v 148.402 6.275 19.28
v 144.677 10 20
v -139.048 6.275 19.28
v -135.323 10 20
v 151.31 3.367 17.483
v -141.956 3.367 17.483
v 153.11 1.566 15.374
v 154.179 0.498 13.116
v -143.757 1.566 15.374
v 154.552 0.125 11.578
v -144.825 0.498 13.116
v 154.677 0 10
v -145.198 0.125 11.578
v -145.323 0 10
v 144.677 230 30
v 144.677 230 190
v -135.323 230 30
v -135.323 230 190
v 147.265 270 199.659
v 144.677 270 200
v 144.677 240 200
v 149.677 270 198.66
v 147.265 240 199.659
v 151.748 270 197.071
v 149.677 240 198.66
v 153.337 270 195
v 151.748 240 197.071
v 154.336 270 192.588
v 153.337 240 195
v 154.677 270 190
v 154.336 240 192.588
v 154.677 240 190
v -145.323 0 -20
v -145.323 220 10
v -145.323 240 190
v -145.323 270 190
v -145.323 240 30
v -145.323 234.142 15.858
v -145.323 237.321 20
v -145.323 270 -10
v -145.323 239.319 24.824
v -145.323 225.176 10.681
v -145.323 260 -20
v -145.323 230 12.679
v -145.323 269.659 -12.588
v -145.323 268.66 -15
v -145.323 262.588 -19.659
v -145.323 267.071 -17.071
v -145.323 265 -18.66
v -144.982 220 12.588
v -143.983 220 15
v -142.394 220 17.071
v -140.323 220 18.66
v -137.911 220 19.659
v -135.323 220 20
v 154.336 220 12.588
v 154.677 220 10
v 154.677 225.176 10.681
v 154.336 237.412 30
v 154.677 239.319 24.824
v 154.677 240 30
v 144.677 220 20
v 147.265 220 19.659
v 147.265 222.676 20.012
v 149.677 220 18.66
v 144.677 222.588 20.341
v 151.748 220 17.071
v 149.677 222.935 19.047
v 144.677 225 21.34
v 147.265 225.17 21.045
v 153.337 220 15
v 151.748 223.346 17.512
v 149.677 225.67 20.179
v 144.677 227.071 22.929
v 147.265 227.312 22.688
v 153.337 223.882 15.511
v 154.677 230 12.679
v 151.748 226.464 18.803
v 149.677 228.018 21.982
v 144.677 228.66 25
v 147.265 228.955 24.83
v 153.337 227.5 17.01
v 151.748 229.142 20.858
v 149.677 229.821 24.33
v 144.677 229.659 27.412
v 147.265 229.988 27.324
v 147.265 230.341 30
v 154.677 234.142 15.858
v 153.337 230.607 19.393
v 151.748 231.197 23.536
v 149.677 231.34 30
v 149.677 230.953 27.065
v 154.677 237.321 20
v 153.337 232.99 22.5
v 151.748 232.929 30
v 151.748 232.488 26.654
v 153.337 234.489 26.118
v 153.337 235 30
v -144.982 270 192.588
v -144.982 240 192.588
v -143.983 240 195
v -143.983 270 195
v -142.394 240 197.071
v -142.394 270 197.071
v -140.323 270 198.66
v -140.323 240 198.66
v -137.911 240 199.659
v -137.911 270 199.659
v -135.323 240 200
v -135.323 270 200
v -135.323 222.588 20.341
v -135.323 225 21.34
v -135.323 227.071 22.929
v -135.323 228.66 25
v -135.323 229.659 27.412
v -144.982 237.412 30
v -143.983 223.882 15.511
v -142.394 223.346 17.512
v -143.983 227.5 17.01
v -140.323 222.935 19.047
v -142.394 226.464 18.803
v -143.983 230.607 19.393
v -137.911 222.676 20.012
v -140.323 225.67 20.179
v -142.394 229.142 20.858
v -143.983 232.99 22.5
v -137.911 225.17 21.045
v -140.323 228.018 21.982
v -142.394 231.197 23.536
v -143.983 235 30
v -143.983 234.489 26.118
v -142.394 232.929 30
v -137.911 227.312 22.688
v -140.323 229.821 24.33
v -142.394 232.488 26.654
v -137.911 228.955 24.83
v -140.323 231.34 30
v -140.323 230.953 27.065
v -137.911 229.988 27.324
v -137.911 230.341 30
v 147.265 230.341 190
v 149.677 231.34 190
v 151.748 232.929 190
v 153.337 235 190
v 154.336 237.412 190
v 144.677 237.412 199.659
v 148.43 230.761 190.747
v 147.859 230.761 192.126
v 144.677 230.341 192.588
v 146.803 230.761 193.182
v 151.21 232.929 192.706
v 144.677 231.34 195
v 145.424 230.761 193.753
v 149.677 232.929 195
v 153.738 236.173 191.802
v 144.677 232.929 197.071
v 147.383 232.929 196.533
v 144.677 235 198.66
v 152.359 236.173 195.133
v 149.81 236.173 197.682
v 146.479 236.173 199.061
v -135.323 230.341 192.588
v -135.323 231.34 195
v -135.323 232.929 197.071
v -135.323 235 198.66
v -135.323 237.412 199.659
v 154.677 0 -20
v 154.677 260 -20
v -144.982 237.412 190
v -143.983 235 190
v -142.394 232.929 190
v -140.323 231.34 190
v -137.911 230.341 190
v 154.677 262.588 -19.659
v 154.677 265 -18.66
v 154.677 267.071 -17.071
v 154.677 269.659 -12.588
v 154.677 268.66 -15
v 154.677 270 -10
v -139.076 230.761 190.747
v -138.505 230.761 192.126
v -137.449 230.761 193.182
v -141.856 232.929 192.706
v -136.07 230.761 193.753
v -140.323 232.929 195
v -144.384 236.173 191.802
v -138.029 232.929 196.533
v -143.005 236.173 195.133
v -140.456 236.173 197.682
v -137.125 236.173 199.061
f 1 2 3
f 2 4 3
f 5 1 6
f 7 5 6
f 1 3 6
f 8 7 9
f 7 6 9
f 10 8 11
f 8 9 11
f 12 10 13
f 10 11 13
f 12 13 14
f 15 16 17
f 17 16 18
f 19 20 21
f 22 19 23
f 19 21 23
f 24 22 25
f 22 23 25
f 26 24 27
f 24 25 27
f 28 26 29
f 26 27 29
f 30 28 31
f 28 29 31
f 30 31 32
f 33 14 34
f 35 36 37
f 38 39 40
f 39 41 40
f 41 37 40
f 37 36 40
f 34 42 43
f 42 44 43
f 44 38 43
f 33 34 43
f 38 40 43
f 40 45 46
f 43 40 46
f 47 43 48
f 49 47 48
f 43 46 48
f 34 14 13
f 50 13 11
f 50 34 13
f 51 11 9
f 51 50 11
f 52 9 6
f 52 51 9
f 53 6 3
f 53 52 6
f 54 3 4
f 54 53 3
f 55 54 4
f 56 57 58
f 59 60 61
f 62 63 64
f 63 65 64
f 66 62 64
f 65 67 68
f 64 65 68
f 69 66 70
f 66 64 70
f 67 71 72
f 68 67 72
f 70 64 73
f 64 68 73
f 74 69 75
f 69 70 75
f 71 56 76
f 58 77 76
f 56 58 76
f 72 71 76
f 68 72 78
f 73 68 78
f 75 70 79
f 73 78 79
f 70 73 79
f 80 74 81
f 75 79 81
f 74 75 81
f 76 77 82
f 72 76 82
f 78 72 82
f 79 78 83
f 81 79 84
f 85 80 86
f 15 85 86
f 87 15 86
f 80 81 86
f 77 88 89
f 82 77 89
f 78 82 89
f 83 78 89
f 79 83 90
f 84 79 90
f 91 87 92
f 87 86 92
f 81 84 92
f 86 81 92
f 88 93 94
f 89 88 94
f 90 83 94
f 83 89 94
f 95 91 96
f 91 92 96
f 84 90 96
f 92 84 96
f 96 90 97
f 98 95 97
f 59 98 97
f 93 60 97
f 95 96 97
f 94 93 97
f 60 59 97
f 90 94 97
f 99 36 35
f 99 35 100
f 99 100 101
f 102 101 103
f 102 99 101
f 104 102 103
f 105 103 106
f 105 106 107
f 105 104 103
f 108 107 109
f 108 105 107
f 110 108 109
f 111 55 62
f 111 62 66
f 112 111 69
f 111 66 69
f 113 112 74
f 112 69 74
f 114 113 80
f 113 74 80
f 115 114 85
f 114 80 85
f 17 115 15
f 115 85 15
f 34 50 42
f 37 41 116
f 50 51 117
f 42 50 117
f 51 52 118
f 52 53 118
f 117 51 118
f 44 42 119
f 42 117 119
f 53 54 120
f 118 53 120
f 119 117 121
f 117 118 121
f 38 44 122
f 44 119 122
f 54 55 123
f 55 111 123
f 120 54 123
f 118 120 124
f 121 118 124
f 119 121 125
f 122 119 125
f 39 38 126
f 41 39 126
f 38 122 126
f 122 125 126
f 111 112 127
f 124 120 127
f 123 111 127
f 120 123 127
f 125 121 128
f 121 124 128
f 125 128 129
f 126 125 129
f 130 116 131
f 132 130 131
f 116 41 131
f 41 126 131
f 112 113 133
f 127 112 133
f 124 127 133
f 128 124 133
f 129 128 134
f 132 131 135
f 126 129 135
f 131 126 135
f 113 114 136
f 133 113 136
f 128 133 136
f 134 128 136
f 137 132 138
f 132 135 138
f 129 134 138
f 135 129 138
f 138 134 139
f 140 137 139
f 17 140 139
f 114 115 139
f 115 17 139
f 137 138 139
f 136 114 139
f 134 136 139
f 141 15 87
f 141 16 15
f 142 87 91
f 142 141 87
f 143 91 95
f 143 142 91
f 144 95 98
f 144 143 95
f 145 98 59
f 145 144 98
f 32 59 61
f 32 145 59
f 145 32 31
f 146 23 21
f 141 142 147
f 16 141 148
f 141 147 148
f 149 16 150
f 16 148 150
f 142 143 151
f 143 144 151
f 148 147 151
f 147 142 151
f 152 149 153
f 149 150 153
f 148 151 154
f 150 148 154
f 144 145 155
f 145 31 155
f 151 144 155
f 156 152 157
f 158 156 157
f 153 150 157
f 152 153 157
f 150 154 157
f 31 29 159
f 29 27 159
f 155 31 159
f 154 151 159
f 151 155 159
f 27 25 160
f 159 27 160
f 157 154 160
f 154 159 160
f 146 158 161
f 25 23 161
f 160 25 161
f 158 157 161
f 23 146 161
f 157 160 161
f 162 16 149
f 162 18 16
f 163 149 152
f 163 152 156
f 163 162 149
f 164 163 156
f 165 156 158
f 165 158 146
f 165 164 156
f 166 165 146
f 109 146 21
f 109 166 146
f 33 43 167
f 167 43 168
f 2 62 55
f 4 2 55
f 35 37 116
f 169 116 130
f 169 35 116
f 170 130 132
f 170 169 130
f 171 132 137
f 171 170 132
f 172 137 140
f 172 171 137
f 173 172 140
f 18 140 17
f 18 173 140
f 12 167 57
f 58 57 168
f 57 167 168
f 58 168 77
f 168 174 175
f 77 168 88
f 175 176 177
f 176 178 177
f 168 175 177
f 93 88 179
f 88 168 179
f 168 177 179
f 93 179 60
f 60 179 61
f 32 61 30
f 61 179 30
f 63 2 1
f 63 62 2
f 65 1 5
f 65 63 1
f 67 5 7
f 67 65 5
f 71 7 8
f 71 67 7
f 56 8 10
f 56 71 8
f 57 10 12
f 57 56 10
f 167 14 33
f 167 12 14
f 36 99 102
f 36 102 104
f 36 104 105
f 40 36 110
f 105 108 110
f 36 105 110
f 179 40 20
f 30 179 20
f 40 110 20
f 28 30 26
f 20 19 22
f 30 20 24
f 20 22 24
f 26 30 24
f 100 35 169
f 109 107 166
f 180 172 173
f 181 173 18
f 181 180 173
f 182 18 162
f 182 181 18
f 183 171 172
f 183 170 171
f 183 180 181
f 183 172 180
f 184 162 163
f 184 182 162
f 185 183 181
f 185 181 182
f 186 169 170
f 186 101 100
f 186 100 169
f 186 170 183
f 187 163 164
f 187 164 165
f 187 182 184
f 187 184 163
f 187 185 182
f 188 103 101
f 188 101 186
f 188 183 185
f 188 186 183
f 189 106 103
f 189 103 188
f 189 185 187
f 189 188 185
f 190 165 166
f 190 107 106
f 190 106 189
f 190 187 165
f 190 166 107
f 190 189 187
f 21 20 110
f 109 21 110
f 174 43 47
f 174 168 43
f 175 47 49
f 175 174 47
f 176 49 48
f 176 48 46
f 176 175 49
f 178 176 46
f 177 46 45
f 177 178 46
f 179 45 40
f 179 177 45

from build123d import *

# Parameters (mm, degrees)
F0_W    = 300
F0_H    = 40
F3_F1_R = 10
F3_F2_R = 10


with BuildPart() as f2:
    # F2: sweep along a path in F1
    with BuildLine(Plane.YZ) as f2_path:
        Line((0, 0), (250, 0))
        Line((250, 0), (250, 200))
    # F0 (on Front) → F2 (sweep)
    with BuildSketch(Plane.XZ):
        with Locations((4.6769320033, 0)):
            Rectangle(F0_W, F0_H)
    sweep(path=f2_path.line, transition=Transition.RIGHT)

    # F3: fillet of radius 10 on 8 edges, made by hand

    # F3_f1
    f3_f1_edges = [f2.edges().sort_by_distance(p)[0] for p in [
        (4.6769320033, 230, 20),
    ]]
    fillet(f3_f1_edges, radius=F3_F1_R)

    # F3_f2
    f3_f2_edges = [f2.edges().sort_by_distance(p)[0] for p in [
        (154.6769320033, 250, 200),
        (-145.3230679967, 250, 200),
        (154.6769320033, 110, 20),
        (4.6769320033, 0, 20),
        (-145.3230679967, 110, 20),
        (4.6769320033, 270, -20),
        (4.6769320033, 230, 200),
        (-145.3230679967, 227.0710678119, 22.9289321881),
        (154.6769320033, 227.0710678119, 22.9289321881),
    ]]
    fillet(f3_f2_edges, radius=F3_F2_R)


solid = f2.part
